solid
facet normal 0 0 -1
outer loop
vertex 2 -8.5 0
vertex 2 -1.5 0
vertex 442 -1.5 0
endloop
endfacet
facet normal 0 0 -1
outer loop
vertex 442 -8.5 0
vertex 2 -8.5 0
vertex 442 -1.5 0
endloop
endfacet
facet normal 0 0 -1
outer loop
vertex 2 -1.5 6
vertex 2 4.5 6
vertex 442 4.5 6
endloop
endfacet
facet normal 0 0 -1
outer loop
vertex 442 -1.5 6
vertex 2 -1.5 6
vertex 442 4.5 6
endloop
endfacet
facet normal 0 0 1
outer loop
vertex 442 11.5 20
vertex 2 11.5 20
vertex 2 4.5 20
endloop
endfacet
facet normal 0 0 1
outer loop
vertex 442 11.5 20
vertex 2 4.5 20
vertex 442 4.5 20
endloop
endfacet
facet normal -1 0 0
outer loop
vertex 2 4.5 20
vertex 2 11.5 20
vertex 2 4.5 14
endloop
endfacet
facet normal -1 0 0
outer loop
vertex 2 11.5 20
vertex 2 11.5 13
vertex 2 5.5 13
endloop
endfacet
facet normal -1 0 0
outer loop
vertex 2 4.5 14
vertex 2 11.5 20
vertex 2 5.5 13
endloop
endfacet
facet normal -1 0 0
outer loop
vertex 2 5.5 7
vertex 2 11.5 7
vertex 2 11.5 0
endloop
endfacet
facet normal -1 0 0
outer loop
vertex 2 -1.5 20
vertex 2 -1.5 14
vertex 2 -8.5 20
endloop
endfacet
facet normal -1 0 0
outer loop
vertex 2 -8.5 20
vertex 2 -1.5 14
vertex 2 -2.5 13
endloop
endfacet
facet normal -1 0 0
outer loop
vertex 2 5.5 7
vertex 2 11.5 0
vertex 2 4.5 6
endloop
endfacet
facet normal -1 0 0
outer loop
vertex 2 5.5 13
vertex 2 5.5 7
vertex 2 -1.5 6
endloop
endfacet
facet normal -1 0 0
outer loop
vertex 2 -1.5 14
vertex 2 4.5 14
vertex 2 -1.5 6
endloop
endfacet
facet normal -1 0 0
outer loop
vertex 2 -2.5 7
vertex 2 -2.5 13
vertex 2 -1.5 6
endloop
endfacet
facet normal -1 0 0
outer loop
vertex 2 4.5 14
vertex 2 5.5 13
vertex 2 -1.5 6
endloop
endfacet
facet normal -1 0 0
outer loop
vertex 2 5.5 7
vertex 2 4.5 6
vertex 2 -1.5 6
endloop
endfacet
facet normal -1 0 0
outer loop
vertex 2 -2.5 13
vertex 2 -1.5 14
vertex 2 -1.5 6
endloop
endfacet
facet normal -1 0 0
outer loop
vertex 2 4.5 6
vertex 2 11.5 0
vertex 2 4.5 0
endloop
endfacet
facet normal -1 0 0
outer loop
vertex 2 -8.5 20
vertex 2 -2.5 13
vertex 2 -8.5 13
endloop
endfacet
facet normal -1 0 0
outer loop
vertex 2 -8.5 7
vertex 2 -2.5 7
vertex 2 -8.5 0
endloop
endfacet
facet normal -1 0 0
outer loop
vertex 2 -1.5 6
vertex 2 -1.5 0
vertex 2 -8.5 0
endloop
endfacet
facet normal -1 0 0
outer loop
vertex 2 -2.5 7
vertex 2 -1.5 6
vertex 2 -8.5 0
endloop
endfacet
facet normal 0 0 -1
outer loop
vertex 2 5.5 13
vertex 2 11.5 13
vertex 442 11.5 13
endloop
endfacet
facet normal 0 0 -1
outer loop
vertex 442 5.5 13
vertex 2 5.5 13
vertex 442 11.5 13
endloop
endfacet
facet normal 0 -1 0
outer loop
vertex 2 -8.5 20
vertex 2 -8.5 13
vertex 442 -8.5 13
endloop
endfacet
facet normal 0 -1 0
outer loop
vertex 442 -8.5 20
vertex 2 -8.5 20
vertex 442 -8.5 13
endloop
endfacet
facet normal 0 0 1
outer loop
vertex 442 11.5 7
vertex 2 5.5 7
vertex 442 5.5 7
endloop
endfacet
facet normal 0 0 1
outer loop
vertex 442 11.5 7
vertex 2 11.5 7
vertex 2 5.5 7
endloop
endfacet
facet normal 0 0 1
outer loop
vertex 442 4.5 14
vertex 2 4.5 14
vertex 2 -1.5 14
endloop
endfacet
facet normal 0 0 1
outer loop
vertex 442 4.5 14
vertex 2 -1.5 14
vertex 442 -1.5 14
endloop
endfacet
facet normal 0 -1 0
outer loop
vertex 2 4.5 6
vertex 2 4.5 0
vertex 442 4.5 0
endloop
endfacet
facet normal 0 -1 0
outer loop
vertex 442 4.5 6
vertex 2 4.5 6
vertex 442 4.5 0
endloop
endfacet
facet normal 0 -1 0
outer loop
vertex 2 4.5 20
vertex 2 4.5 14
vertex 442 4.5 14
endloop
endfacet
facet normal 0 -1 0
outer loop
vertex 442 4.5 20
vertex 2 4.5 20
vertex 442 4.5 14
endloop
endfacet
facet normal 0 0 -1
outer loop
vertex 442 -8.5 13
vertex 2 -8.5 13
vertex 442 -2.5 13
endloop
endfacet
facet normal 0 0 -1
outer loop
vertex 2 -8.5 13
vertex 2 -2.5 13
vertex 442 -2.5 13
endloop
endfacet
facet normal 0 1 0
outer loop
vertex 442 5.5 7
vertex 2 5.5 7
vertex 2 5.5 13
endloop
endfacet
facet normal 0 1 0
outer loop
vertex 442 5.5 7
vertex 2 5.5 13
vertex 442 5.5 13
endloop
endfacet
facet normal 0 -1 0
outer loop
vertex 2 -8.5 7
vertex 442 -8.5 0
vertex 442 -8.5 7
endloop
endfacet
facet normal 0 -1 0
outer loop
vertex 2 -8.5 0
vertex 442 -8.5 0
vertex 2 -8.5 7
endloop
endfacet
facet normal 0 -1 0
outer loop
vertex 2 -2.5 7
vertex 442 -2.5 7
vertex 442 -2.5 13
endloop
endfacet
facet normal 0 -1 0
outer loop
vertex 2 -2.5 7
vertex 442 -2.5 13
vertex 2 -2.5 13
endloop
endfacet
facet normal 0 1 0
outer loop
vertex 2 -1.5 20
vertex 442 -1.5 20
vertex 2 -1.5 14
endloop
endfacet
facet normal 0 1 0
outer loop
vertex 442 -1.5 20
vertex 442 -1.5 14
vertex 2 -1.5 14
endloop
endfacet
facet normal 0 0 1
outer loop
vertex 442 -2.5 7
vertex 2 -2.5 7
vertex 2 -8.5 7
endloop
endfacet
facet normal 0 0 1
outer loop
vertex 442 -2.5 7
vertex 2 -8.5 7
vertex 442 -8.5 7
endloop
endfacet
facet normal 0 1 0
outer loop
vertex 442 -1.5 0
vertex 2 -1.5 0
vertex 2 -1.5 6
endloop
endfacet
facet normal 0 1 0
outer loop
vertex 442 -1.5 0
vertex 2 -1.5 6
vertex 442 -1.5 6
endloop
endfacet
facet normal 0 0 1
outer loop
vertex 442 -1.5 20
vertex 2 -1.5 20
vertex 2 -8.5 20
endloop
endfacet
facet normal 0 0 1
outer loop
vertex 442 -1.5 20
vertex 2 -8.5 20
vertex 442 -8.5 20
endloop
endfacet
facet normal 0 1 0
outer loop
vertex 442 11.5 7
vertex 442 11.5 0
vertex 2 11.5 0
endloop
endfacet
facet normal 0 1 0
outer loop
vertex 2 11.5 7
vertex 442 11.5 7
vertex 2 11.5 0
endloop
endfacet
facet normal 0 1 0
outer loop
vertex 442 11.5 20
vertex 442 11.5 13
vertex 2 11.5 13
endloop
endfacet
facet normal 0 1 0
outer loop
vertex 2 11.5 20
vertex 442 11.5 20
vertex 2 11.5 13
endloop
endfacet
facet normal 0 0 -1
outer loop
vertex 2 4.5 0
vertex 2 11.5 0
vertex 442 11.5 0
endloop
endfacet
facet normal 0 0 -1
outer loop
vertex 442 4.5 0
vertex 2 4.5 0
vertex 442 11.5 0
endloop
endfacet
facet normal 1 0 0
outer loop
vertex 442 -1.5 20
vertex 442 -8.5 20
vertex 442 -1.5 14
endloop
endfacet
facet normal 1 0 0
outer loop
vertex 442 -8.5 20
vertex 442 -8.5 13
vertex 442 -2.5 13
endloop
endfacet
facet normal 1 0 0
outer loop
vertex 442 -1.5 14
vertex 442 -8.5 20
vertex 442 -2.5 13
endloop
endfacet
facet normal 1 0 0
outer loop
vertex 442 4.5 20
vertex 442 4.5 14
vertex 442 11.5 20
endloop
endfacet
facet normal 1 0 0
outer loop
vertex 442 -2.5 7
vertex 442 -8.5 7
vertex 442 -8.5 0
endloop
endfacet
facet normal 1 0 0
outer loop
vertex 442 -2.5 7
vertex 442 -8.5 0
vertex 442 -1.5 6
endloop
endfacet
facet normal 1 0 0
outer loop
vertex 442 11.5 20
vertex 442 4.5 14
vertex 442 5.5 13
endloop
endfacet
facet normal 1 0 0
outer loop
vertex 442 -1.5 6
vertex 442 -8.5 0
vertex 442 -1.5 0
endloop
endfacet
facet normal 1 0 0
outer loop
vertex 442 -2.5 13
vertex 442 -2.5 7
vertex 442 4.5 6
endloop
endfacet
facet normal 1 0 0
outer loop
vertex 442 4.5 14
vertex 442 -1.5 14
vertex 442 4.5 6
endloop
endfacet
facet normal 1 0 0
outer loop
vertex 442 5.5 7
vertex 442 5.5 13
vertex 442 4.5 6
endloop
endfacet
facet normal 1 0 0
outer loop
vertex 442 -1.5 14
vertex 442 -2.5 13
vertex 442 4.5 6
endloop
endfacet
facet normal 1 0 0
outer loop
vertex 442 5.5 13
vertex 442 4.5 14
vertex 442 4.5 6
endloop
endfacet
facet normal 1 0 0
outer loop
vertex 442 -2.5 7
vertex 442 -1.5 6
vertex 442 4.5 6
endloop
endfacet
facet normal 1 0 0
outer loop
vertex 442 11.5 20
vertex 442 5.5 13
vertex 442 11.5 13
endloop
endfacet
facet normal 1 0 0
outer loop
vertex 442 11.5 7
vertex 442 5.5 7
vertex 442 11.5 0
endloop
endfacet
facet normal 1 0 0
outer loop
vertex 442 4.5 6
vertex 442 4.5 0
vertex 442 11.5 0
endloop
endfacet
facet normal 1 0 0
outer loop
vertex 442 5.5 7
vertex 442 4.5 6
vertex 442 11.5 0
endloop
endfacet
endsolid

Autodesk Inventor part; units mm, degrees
ref_plane "YZ Plane" through (0, 0, 0) normal (1, 0, 0) x (0, 1, 0)
ref_plane "XZ Plane" through (0, 0, 0) normal (0, 1, 0) x (-1, 0, 0)
ref_plane "XY Plane" through (0, 0, 0) normal (0, 0, 1) x (1, 0, 0)
sketch "Sketch8" plane through (0, 0, 0) normal (0, 0, 1) x (1, 0, 0)
  line L0 (-3, 0) -> (-3, 3)
  line L1 (0, 0) -> (444, 0)
  line L2 (444, 0) -> (444, 3)
  line L3 (0, 3) -> (444, 3)
  line L4 (0, 0) -> (0, 3)
  line L5 (0, 3) -> (-3, 3)
  line L6 (0, 0) -> (-3, 0)
  line L7 (447, 3) -> (444, 3)
  line L8 (447, 0) -> (447, 3)
  line L9 (447, 0) -> (444, 0)
  line L10 (0, 4.5) -> (442, 4.5)
  line L11 (0, -1.5) -> (442, -1.5)
  line L12 (442, 4.5) -> (442, -1.5)
  line L13 (2, 4.5) -> (2, -1.5)
  line L14 (2, 4.5) -> (442, 4.5)
  line L15 (442, 4.5) -> (442, 11.5)
  line L16 (442, 11.5) -> (2, 11.5)
  line L17 (2, 11.5) -> (2, 4.5)
  line L18 (2, -1.5) -> (442, -1.5)
  line L19 (442, -1.5) -> (442, -8.5)
  line L20 (442, -8.5) -> (2, -8.5)
  line L21 (2, -8.5) -> (2, -1.5)
  point P0 (-3, 1.5)
extrude "Extrusion7" add sketch "Sketch8" along normal blind 6 contours L11 L19 L20 L21 | L17 L16 L15 L10
sketch "Sketch9" plane through (0, 0, 6) normal (0, 0, 1) x (1, 0, 0)
  line L0 (2, 11.5) -> (2, 4.5) projected
  line L1 (2, 4.5) -> (442, 4.5) projected
  line L2 (442, 4.5) -> (442, 11.5) projected
  line L3 (442, 11.5) -> (2, 11.5) projected
  line L4 (442, -8.5) -> (442, -1.5) projected
  line L5 (442, -1.5) -> (2, -1.5) projected
  line L6 (2, -1.5) -> (2, -8.5) projected
  line L7 (2, -8.5) -> (442, -8.5) projected
  line L8 (2, 4.5) -> (2, -1.5)
  line L9 (442, -1.5) -> (442, 4.5)
  point P0 (0, 0)
extrude "Extrusion8" add sketch "Sketch9" along normal blind 1
sketch "Sketch10" plane through (0, 0, 7) normal (0, 0, 1) x (1, 0, 0)
  line L0 (2, 4.5) -> (442, 4.5) projected
  line L1 (442, -1.5) -> (2, -1.5) projected
  line L2 (442, -2.5) -> (2, -2.5)
  line L3 (2, 5.5) -> (442, 5.5)
  line L4 (2, 5.5) -> (2, -2.5)
  line L5 (2, 11.5) -> (2, -8.5) projected
  line L6 (442, 5.5) -> (442, -2.5)
  point P0 (0, 0)
  dimension "d33" = 1
  dimension "d34" = 1
extrude "Extrusion9" add sketch "Sketch10" along normal blind 6
sketch "Sketch11" plane through (0, 0, 13) normal (0, 0, 1) x (1, 0, 0)
  line L0 (447, 0) -> (444, 0) projected
  line L1 (2, 5.5) -> (442, 5.5) projected
  line L2 (442, 5.5) -> (442, 11.5) projected
  line L3 (442, 11.5) -> (2, 11.5) projected
  line L4 (2, 11.5) -> (2, 5.5) projected
  line L5 (442, -2.5) -> (2, -2.5) projected
  line L6 (2, -2.5) -> (2, -8.5) projected
  line L7 (2, -8.5) -> (442, -8.5) projected
  line L8 (442, -8.5) -> (442, -2.5) projected
  line L9 (442, 5.5) -> (2, 5.5) projected
  line L10 (2, 5.5) -> (2, -2.5) projected
  line L11 (2, -2.5) -> (442, -2.5) projected
  line L12 (442, -2.5) -> (442, 5.5) projected
  point P0 (0, 0)
  point P1 (2, -2.5)
extrude "Extrusion10" add sketch "Sketch11" along normal blind 1
sketch "Sketch12" plane through (0, 0, 14) normal (0, 0, 1) x (1, 0, 0)
  line L0 (442, 5.5) -> (2, 5.5) projected
  line L1 (2, 11.5) -> (2, 4.5) projected
  line L2 (442, 11.5) -> (2, 11.5) projected
  line L3 (442, 4.5) -> (442, 11.5) projected
  line L4 (2, 4.5) -> (442, 4.5) projected
  line L5 (442, -8.5) -> (442, -1.5) projected
  line L6 (2, -8.5) -> (442, -8.5) projected
  line L7 (2, -1.5) -> (2, -8.5) projected
  line L8 (442, -1.5) -> (2, -1.5) projected
  point P0 (0, 0)
extrude "Extrusion11" add sketch "Sketch12" along normal blind 6
properties part number "xbar"
